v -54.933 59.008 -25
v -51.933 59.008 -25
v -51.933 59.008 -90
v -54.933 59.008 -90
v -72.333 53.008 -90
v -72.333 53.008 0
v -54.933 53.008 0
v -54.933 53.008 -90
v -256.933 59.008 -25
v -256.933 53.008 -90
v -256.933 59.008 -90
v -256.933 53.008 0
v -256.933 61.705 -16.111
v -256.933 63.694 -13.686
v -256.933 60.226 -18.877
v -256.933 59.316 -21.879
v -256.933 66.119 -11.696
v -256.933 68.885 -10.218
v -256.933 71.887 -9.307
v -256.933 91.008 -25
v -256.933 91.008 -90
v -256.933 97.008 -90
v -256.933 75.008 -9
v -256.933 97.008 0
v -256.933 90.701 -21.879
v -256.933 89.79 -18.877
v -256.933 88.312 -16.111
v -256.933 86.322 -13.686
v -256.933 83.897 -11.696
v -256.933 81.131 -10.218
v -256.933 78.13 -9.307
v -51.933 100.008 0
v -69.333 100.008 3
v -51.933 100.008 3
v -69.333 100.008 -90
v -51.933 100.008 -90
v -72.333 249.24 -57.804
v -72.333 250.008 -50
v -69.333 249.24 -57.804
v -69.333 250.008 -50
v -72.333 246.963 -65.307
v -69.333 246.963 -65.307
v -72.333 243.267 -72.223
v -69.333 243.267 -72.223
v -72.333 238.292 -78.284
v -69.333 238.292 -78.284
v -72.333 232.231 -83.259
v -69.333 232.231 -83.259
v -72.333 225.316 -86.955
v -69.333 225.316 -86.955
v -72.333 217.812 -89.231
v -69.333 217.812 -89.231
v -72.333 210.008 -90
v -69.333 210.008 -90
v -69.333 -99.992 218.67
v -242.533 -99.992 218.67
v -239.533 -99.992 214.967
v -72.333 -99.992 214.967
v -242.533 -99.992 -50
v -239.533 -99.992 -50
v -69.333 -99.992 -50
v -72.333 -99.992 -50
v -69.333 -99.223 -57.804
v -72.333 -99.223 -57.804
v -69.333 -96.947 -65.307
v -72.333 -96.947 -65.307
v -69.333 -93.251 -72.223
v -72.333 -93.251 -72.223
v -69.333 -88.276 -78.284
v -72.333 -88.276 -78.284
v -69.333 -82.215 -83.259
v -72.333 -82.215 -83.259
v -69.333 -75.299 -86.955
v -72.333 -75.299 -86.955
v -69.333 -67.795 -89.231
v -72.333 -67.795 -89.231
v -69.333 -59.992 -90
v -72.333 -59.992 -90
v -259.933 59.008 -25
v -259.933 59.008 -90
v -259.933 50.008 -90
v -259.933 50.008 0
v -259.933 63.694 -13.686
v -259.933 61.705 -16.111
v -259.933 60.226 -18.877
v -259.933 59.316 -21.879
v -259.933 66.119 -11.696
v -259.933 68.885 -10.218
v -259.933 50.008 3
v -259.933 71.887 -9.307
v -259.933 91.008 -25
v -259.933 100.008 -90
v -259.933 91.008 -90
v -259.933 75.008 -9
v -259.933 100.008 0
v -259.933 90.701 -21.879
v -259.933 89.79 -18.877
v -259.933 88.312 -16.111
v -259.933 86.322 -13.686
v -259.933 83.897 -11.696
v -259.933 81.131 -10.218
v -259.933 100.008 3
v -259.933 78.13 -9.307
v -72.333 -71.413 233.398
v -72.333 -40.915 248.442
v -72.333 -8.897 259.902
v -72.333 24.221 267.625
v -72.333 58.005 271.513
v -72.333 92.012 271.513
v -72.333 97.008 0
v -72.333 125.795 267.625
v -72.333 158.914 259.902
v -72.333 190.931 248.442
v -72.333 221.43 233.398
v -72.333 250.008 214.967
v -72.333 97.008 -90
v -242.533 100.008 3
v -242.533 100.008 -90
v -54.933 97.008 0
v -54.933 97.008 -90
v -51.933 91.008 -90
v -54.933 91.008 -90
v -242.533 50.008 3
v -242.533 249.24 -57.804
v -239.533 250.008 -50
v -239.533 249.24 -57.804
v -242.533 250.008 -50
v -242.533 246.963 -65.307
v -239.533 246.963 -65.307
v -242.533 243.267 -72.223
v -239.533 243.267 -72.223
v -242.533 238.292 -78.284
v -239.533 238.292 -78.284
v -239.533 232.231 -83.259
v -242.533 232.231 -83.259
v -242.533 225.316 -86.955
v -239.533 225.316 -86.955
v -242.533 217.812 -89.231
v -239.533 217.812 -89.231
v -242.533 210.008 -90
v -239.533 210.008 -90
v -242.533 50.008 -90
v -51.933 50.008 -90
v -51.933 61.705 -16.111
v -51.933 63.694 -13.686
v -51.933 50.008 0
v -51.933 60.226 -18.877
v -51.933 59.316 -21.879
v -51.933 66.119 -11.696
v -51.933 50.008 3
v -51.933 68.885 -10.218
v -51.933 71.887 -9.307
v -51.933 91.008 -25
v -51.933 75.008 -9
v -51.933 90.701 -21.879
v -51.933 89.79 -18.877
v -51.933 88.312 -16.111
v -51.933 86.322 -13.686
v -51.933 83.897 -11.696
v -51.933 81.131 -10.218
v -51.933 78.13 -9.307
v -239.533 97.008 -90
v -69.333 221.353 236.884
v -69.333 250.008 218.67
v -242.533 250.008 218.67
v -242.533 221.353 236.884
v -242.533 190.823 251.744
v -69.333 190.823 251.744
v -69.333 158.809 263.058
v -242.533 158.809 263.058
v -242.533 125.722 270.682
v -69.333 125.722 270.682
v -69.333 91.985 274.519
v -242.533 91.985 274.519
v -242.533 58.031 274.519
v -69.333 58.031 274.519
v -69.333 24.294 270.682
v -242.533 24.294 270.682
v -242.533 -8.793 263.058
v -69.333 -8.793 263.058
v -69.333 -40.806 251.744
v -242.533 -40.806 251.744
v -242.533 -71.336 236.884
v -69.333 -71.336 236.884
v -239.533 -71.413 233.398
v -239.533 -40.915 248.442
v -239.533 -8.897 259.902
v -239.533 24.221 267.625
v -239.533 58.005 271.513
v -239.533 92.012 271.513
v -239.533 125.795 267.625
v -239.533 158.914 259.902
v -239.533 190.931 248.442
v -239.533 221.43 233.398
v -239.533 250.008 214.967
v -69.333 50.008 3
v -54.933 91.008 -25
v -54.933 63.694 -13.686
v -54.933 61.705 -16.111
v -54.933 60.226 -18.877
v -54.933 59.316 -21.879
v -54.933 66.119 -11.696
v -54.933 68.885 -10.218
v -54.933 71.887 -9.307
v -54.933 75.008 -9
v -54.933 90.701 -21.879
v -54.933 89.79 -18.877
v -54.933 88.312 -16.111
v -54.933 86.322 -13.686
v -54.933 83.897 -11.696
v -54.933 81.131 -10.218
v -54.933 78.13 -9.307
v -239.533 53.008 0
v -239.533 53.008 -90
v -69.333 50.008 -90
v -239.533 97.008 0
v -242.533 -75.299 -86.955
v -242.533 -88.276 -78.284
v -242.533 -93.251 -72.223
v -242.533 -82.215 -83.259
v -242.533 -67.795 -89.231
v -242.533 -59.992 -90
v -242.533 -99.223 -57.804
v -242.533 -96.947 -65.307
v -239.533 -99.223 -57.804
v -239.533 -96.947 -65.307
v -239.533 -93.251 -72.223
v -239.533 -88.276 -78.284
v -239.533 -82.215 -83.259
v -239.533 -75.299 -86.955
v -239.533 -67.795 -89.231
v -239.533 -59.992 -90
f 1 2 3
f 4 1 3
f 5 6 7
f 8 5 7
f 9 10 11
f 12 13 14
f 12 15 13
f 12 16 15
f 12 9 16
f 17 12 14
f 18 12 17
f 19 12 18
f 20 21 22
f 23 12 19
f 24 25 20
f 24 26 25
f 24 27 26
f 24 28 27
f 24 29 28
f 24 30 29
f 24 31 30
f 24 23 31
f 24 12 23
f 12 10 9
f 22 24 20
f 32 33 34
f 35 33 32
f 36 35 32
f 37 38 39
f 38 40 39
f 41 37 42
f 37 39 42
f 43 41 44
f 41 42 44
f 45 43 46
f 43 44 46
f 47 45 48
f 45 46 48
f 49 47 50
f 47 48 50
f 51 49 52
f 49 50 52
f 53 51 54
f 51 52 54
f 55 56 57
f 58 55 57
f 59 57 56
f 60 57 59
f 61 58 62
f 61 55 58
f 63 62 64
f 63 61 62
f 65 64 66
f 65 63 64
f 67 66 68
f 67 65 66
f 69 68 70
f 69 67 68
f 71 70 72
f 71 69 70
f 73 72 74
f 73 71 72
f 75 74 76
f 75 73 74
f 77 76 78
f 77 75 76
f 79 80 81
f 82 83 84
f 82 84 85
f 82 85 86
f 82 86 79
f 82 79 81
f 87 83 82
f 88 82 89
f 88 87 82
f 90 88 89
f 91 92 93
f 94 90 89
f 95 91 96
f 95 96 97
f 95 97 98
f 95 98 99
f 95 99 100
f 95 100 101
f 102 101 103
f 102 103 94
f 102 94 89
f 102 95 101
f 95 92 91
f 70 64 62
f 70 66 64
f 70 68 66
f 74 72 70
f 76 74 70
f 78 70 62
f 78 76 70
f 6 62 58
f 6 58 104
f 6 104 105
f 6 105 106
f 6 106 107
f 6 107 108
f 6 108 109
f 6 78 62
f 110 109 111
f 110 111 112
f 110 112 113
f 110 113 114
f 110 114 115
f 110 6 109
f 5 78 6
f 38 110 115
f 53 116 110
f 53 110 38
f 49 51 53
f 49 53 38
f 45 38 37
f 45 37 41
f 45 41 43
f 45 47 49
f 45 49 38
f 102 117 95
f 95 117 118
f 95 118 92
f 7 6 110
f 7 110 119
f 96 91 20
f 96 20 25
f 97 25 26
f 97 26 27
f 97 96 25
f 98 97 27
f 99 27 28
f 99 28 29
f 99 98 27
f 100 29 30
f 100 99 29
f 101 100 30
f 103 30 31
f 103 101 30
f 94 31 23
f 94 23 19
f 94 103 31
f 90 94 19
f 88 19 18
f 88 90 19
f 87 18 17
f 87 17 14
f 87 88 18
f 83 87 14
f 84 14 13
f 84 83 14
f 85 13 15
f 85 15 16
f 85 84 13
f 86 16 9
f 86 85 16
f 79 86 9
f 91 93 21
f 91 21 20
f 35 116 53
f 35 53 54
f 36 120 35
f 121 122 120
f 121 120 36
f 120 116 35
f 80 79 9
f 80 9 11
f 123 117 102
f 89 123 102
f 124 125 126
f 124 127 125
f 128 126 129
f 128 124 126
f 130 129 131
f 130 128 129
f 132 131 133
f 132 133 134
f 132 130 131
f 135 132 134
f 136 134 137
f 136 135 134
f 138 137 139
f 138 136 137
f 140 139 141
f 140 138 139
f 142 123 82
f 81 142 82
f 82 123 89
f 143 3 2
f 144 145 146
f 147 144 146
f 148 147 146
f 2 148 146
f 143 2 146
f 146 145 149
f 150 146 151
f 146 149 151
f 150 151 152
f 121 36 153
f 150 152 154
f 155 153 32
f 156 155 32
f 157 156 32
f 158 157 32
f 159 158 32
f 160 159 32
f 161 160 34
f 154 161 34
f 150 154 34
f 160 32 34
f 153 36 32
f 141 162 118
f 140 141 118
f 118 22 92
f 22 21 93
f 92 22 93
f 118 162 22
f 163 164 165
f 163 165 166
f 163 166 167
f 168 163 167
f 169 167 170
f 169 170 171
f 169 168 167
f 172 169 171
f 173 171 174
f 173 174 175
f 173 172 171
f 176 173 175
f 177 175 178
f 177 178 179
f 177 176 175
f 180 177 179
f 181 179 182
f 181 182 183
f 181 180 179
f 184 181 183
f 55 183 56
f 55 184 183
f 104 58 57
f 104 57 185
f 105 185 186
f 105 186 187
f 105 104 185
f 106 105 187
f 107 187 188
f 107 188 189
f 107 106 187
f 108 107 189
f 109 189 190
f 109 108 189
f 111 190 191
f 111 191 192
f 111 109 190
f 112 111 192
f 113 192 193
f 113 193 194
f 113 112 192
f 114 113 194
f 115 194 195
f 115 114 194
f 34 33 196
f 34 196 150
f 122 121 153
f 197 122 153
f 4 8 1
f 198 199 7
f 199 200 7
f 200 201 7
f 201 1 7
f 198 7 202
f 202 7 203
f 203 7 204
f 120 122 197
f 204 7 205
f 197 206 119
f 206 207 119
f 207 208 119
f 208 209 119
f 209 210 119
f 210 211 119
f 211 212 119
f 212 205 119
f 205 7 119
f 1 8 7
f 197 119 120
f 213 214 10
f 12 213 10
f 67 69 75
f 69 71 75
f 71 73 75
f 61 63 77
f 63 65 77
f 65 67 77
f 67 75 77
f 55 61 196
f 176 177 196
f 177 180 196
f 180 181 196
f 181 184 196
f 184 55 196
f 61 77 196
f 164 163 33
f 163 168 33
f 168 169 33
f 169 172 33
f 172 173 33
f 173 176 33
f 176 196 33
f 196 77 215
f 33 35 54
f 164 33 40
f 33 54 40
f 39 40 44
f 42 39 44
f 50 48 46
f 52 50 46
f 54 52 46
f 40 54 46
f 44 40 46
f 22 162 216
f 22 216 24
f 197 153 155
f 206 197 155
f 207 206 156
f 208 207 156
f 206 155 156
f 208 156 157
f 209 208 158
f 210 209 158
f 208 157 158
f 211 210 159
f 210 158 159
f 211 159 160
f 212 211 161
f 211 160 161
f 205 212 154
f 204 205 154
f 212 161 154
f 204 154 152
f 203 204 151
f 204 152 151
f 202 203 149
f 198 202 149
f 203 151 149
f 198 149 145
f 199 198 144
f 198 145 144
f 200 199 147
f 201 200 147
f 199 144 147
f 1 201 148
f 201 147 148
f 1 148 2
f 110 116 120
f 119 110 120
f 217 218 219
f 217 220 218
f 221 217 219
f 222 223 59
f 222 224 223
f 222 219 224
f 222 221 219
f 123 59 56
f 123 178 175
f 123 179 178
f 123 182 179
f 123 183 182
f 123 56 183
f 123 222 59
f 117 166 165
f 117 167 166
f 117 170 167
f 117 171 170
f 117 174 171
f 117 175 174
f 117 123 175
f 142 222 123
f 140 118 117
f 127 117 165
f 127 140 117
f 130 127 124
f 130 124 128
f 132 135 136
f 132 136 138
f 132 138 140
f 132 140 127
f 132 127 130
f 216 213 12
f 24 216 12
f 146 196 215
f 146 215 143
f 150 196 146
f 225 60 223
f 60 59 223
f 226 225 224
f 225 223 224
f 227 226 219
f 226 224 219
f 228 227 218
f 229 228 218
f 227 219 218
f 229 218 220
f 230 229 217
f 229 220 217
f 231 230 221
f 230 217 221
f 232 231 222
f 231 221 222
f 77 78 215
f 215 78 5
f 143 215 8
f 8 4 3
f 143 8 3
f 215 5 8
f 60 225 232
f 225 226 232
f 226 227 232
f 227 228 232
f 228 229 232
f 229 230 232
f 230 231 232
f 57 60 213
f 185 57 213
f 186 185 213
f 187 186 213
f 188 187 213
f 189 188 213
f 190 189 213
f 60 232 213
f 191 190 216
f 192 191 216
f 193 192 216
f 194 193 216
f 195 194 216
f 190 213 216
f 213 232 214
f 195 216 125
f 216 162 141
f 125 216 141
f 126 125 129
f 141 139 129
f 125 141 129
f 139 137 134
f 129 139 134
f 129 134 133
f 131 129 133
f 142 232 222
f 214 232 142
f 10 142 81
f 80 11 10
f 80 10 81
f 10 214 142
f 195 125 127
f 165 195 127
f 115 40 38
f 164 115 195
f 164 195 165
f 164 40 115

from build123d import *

# Parameters (mm, degrees)
BOSS_EXTRUDE1_DEPTH  = 90
CUT_EXTRUDE1_DEPTH   = 15
SKETCH4_W            = 3
SKETCH4_H            = 90
BOSS_EXTRUDE3_DEPTH  = 150
SKETCH5_W            = 3
SKETCH5_H            = 90
BOSS_EXTRUDE4_DEPTH  = 150
SKETCH12_W           = 20.399999779
SKETCH12_H           = 3
BOSS_EXTRUDE5_DEPTH  = 3
SKETCH13_W           = 20.399999779
SKETCH13_H           = 3
BOSS_EXTRUDE6_DEPTH  = 47
SKETCH15_W           = 3
SKETCH15_H           = 150
BOSS_EXTRUDE7_DEPTH  = 3
SKETCH16_W           = 3
SKETCH16_H           = 150
BOSS_EXTRUDE8_DEPTH  = 3
SKETCH17_W           = 3
SKETCH17_H           = 350
BOSS_EXTRUDE9_DEPTH  = 293
CUT_EXTRUDE2_DEPTH   = 263
BOSS_EXTRUDE10_DEPTH = 167.2
FILLET1_R            = 40


with BuildPart() as part:
    # Sketch2 → Boss-Extrude1 (new body)
    with BuildSketch(Plane.XY):
        Polygon((-54.932805324, 53.008197058), (-54.932805324, 97.008197058), (-72.332805103, 97.008197058), (-72.332805103, 100.008197058), (-51.932805324, 100.008197058), (-51.932805324, 50.008197058), (-72.332805103, 50.008197058), (-72.332805103, 53.008197058), align=None)
    extrude(amount=-BOSS_EXTRUDE1_DEPTH)

    # Sketch3 → Cut-Extrude1 (cut)
    with BuildSketch(Plane(origin=(-51.932805324, 0, 0), x_dir=(0, 0, -1), z_dir=(1, 0, 0))):
        with BuildLine():
            Line((25.000000095, 59.008197058), (90, 59.008197058))
            Line((90, 59.008197058), (90, 91.008197058))
            Line((90, 91.008197058), (25.000000095, 91.008197058))
            ThreePointArc((25.000000095, 91.008197058), (9.000000095, 75.008197058), (25.000000095, 59.008197058))
        make_face()
    extrude(amount=-CUT_EXTRUDE1_DEPTH, mode=Mode.SUBTRACT)

    # Sketch4 → Boss-Extrude3 (add)
    with BuildSketch(Plane.XZ.offset(-50.008197058)):
        with Locations((-70.832805103, -45)):
            Rectangle(SKETCH4_W, SKETCH4_H)
    extrude(amount=BOSS_EXTRUDE3_DEPTH)

    # Sketch5 → Boss-Extrude4 (add)
    with BuildSketch(Plane(origin=(0, 100.008197058, 0), x_dir=(1, 0, 0), z_dir=(0, 1, 0))):
        with Locations((-70.832805103, 45)):
            Rectangle(SKETCH5_W, SKETCH5_H)
    extrude(amount=BOSS_EXTRUDE4_DEPTH)

    # Sketch12 → Boss-Extrude5 (add)
    with BuildSketch(Plane.XY):
        with Locations((-62.132805213, 98.508197058)):
            Rectangle(SKETCH12_W, SKETCH12_H)
    extrude(amount=BOSS_EXTRUDE5_DEPTH)

    # Sketch13 → Boss-Extrude6 (add)
    with BuildSketch(Plane.XZ.offset(-97.008197058)):
        with Locations((-62.132805213, 1.5)):
            Rectangle(SKETCH13_W, SKETCH13_H)
    extrude(amount=BOSS_EXTRUDE6_DEPTH)

    # Sketch15 → Boss-Extrude7 (add)
    with BuildSketch(Plane.XY):
        with Locations((-70.832805103, -24.991802942)):
            Rectangle(SKETCH15_W, SKETCH15_H)
    extrude(amount=BOSS_EXTRUDE7_DEPTH)

    # Sketch16 → Boss-Extrude8 (add)
    with BuildSketch(Plane.XY):
        with Locations((-70.832805103, 175.008197058)):
            Rectangle(SKETCH16_W, SKETCH16_H)
    extrude(amount=BOSS_EXTRUDE8_DEPTH)

    # Sketch17 → Boss-Extrude9 (add)
    with BuildSketch(Plane.XY.offset(3)):
        with Locations((-70.832805103, 75.008197058)):
            Rectangle(SKETCH17_W, SKETCH17_H)
    extrude(amount=BOSS_EXTRUDE9_DEPTH)

    # Sketch18 → Cut-Extrude2 (cut)
    with BuildSketch(Plane(origin=(-69.332805103, 0, 0), x_dir=(0, 0, -1), z_dir=(1, 0, 0))):
        with BuildLine():
            Line((-218.669858525, -99.991802942), (-296, -99.991802942))
            Line((-296, -99.991802942), (-296, 250.008197058))
            Line((-296, 250.008197058), (-218.669858525, 250.008197058))
            ThreePointArc((-218.669858525, 250.008197058), (-274.999999905, 75.008197058), (-218.669858525, -99.991802942))
        make_face()
    extrude(amount=-CUT_EXTRUDE2_DEPTH, mode=Mode.SUBTRACT)


with BuildPart() as body_2:
    # Mirror3: mirrored copy
    add(part.part.mirror(Plane.ZY.offset(155.932805134)))


with BuildPart() as part_1:
    add(part.part)

    add(body_2.part)  # Boss-Extrude10 merges body 2
    # Sketch20 → Boss-Extrude10 (add)
    with BuildSketch(Plane.ZY.offset(72.332805103)):
        with BuildLine():
            Line((214.966664257, 250.008197058), (218.669858525, 250.008197058))
            ThreePointArc((218.669858525, 250.008197058), (274.999999905, 75.008197058), (218.669858525, -99.991802942))
            Line((218.669858525, -99.991802942), (214.966664257, -99.991802942))
            ThreePointArc((214.966664257, -99.991802942), (271.999999905, 75.008197058), (214.966664257, 250.008197058))
        make_face()
    extrude(amount=BOSS_EXTRUDE10_DEPTH)

    # Fillet1
    fillet1_edges = [part_1.edges().sort_by_distance(p)[0] for p in [
        (-241.032805165, 250.008197058, -90),
        (-241.032805165, -99.991802942, -90),
        (-70.832805103, -99.991802942, -90),
        (-70.832805103, 250.008197058, -90),
    ]]
    fillet(fillet1_edges, radius=FILLET1_R)


solid = part_1.part
